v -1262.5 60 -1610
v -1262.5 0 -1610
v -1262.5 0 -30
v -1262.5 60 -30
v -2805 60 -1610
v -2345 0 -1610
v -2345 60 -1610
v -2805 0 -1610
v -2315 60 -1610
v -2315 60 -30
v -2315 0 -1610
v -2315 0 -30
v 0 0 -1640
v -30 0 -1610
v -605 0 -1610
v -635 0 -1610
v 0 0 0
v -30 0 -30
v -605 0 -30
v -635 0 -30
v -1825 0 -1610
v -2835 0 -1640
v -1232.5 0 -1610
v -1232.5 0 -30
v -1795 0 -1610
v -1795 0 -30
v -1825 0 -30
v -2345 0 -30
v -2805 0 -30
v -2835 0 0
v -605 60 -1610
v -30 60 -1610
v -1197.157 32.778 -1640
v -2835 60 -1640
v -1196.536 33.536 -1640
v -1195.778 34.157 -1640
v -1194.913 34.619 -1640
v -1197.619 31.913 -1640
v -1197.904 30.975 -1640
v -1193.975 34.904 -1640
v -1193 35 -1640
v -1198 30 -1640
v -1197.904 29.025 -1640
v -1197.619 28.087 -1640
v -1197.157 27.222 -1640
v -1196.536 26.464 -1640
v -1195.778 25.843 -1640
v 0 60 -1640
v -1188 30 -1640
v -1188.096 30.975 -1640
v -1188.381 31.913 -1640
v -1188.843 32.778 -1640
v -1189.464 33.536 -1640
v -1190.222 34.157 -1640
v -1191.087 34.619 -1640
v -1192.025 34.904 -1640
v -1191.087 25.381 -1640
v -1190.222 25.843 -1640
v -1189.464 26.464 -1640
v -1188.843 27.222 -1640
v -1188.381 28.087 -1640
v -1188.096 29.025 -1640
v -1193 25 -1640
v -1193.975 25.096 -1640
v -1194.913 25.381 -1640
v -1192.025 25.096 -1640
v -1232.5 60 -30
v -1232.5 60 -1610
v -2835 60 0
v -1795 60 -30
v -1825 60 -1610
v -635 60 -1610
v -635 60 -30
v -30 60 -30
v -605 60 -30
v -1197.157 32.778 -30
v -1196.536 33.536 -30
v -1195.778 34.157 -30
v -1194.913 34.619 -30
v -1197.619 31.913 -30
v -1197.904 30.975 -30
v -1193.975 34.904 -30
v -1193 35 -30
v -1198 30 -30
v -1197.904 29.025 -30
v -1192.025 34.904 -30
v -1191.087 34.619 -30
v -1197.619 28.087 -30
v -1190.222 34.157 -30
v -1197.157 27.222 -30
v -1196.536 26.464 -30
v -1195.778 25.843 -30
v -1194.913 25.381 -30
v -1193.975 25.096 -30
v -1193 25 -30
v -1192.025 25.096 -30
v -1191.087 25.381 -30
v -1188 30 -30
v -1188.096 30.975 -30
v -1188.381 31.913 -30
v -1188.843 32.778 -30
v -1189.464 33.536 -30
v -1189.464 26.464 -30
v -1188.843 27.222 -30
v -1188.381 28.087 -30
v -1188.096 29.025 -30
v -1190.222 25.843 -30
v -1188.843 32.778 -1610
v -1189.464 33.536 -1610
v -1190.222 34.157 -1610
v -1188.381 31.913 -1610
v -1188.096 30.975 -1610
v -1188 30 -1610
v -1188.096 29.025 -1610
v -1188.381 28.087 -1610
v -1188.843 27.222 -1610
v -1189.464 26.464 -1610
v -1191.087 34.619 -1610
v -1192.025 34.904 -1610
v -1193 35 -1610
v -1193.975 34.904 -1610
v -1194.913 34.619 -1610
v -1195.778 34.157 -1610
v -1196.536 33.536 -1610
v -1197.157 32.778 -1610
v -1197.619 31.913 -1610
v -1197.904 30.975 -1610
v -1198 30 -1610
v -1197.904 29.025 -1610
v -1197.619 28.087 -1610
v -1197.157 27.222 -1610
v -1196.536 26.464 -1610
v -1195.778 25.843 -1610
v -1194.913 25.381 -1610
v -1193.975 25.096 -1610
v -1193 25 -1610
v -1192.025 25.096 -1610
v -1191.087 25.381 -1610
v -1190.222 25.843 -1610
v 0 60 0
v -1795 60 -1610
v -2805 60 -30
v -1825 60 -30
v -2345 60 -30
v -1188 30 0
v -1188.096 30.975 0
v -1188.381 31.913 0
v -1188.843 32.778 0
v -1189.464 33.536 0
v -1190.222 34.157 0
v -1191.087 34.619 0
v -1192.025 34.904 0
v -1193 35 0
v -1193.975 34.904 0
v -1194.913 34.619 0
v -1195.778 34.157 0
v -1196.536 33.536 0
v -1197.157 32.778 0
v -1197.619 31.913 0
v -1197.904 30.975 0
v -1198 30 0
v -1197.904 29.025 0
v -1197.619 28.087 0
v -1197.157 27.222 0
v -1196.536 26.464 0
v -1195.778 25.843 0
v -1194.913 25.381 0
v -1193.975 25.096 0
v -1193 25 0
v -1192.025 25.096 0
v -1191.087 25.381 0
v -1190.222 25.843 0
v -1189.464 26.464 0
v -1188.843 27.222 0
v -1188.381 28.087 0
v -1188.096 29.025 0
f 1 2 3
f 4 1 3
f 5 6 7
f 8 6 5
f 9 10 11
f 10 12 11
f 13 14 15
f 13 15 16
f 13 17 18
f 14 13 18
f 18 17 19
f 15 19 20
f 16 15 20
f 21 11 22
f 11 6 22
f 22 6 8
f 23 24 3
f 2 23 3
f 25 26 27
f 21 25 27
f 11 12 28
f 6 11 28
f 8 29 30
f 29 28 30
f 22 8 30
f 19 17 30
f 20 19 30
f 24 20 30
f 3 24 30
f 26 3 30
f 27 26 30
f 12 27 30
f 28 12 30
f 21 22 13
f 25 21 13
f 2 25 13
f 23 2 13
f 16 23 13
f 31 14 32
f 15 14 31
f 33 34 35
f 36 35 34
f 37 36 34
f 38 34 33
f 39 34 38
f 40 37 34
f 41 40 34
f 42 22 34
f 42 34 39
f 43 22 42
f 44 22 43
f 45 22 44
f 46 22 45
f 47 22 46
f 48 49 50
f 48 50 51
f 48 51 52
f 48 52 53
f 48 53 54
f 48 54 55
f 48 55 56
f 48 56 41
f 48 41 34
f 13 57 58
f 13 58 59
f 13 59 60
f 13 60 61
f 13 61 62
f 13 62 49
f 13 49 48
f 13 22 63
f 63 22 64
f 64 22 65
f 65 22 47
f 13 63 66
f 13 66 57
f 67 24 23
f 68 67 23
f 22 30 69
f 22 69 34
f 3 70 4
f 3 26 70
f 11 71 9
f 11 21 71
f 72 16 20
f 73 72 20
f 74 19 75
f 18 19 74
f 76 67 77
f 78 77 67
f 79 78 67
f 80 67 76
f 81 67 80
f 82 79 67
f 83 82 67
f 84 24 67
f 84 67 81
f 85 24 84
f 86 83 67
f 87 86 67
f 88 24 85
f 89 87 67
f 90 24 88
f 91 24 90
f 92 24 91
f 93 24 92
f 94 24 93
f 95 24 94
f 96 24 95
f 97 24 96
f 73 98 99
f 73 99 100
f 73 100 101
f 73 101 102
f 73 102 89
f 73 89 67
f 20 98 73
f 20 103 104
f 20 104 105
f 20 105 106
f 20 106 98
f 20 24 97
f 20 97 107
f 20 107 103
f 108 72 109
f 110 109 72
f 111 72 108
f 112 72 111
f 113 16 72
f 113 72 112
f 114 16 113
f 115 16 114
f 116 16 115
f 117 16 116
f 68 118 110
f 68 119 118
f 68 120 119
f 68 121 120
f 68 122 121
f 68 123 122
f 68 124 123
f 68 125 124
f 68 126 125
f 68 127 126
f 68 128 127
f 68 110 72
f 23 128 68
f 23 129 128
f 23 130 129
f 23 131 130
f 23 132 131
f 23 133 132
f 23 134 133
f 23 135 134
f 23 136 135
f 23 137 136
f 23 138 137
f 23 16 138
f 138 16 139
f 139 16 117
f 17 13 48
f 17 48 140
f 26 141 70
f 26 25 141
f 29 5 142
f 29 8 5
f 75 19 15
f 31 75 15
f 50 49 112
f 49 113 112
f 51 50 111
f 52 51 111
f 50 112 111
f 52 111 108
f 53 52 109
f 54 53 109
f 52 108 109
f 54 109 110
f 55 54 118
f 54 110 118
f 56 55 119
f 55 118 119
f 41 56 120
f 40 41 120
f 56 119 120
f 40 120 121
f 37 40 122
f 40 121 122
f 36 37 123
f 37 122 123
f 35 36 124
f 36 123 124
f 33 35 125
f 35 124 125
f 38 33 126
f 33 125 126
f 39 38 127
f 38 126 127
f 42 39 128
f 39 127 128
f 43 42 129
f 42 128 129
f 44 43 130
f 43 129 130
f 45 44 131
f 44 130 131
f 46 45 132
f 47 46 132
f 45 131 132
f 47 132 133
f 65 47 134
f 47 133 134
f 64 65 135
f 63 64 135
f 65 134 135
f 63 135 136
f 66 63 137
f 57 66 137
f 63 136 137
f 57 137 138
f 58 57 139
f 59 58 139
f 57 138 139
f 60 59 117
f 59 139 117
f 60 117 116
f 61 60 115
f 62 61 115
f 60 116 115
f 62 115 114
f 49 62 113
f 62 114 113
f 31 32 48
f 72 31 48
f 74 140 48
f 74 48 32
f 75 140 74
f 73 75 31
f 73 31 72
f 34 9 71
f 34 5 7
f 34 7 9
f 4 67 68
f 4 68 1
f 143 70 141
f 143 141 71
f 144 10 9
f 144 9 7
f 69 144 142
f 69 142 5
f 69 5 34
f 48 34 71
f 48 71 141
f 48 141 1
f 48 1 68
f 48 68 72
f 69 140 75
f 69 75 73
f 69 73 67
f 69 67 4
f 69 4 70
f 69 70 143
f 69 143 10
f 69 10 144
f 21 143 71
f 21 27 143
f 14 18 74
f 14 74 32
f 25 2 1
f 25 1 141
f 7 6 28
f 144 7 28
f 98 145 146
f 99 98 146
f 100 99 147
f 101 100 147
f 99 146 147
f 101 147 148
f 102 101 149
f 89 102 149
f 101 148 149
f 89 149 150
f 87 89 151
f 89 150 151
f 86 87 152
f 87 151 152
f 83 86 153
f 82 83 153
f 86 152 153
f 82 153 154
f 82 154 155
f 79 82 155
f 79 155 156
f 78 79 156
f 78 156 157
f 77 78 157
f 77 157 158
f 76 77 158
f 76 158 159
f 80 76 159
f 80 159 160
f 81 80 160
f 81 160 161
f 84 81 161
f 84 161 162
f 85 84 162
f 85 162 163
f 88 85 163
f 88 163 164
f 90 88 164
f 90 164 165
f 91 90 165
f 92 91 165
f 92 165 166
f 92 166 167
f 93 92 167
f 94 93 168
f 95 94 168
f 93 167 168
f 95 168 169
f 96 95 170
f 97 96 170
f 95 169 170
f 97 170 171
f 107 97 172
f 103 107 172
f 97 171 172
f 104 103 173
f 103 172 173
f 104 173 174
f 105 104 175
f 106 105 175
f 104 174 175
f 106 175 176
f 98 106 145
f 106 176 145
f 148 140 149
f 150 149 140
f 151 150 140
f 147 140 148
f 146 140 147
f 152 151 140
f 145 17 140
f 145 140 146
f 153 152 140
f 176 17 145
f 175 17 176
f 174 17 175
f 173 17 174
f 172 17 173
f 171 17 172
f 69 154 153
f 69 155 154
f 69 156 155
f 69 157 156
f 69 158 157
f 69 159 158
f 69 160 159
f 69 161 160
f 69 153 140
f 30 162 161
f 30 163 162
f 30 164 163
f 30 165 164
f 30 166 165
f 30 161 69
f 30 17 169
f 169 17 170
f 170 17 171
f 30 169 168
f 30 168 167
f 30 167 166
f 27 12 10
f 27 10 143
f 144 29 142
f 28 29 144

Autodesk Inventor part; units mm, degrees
ref_plane "YZ Plane" through (0, 0, 0) normal (1, 0, 0) x (0, 1, 0)
ref_plane "XZ Plane" through (0, 0, 0) normal (0, 1, 0) x (-1, 0, 0)
ref_plane "XY Plane" through (0, 0, 0) normal (0, 0, 1) x (1, 0, 0)
sketch "Sketch1" plane through (0, 0, 0) normal (0, 1, 0) x (-1, 0, 0)
  line L0 (0, 0) -> (2835, 0)
  line L1 (2835, 0) -> (2835, -1640)
  line L2 (2835, -1640) -> (0, -1640)
  line L3 (0, -1640) -> (0, 0)
  line L4 (30, -30) -> (30, -1610)
  line L5 (2805, -1610) -> (2805, -30)
  line L6 (1232.5, -30) -> (1232.5, -1610)
  line L7 (1262.5, -1610) -> (1262.5, -30)
  line L8 (605, -30) -> (605, -1610)
  line L9 (635, -1610) -> (635, -30)
  line L10 (2315, -30) -> (2315, -1610)
  line L11 (2345, -1610) -> (2345, -30)
  line L12 (1825, -30) -> (1825, -1610)
  line L13 (1795, -1610) -> (1795, -30)
  line L14 (605, -30) -> (30, -30)
  line L15 (30, -1610) -> (605, -1610)
  line L16 (635, -1610) -> (1232.5, -1610)
  line L17 (1232.5, -30) -> (635, -30)
  line L18 (1795, -30) -> (1262.5, -30)
  line L19 (1262.5, -1610) -> (1795, -1610)
  line L20 (2805, -30) -> (2345, -30)
  line L21 (2315, -30) -> (1825, -30)
  line L22 (1825, -1610) -> (2315, -1610)
  line L23 (2345, -1610) -> (2805, -1610)
  dimension "d0" = 2835
  dimension "d1" = 1640
  dimension "d3" = 30
  dimension "d5" = 30
  dimension "d6" = 30
  dimension "d7" = 1262.5
  dimension "d8" = 30
  dimension "d9" = 635
  dimension "d10" = 30
  dimension "d11" = 30
  dimension "d12" = 520
  dimension "d13" = 1040
extrude "Extrusion1" add sketch "Sketch1" along normal blind 60
sketch "Sketch2" plane through (-2835, 0, 0) normal (0, 0, 1) x (1, 0, 0)
  circle A0 centre (1642, 30) radius 5
  line L0 (2835, 0) -> (0, 0) projected
  point P0 (1602.5, 60)
  dimension "d16" = 10
  dimension "d17" = 30
  dimension "d18" = 39.5
extrude "Extrusion2" cut sketch "Sketch2" against normal blind 3000
properties part number "Khung cửa"
